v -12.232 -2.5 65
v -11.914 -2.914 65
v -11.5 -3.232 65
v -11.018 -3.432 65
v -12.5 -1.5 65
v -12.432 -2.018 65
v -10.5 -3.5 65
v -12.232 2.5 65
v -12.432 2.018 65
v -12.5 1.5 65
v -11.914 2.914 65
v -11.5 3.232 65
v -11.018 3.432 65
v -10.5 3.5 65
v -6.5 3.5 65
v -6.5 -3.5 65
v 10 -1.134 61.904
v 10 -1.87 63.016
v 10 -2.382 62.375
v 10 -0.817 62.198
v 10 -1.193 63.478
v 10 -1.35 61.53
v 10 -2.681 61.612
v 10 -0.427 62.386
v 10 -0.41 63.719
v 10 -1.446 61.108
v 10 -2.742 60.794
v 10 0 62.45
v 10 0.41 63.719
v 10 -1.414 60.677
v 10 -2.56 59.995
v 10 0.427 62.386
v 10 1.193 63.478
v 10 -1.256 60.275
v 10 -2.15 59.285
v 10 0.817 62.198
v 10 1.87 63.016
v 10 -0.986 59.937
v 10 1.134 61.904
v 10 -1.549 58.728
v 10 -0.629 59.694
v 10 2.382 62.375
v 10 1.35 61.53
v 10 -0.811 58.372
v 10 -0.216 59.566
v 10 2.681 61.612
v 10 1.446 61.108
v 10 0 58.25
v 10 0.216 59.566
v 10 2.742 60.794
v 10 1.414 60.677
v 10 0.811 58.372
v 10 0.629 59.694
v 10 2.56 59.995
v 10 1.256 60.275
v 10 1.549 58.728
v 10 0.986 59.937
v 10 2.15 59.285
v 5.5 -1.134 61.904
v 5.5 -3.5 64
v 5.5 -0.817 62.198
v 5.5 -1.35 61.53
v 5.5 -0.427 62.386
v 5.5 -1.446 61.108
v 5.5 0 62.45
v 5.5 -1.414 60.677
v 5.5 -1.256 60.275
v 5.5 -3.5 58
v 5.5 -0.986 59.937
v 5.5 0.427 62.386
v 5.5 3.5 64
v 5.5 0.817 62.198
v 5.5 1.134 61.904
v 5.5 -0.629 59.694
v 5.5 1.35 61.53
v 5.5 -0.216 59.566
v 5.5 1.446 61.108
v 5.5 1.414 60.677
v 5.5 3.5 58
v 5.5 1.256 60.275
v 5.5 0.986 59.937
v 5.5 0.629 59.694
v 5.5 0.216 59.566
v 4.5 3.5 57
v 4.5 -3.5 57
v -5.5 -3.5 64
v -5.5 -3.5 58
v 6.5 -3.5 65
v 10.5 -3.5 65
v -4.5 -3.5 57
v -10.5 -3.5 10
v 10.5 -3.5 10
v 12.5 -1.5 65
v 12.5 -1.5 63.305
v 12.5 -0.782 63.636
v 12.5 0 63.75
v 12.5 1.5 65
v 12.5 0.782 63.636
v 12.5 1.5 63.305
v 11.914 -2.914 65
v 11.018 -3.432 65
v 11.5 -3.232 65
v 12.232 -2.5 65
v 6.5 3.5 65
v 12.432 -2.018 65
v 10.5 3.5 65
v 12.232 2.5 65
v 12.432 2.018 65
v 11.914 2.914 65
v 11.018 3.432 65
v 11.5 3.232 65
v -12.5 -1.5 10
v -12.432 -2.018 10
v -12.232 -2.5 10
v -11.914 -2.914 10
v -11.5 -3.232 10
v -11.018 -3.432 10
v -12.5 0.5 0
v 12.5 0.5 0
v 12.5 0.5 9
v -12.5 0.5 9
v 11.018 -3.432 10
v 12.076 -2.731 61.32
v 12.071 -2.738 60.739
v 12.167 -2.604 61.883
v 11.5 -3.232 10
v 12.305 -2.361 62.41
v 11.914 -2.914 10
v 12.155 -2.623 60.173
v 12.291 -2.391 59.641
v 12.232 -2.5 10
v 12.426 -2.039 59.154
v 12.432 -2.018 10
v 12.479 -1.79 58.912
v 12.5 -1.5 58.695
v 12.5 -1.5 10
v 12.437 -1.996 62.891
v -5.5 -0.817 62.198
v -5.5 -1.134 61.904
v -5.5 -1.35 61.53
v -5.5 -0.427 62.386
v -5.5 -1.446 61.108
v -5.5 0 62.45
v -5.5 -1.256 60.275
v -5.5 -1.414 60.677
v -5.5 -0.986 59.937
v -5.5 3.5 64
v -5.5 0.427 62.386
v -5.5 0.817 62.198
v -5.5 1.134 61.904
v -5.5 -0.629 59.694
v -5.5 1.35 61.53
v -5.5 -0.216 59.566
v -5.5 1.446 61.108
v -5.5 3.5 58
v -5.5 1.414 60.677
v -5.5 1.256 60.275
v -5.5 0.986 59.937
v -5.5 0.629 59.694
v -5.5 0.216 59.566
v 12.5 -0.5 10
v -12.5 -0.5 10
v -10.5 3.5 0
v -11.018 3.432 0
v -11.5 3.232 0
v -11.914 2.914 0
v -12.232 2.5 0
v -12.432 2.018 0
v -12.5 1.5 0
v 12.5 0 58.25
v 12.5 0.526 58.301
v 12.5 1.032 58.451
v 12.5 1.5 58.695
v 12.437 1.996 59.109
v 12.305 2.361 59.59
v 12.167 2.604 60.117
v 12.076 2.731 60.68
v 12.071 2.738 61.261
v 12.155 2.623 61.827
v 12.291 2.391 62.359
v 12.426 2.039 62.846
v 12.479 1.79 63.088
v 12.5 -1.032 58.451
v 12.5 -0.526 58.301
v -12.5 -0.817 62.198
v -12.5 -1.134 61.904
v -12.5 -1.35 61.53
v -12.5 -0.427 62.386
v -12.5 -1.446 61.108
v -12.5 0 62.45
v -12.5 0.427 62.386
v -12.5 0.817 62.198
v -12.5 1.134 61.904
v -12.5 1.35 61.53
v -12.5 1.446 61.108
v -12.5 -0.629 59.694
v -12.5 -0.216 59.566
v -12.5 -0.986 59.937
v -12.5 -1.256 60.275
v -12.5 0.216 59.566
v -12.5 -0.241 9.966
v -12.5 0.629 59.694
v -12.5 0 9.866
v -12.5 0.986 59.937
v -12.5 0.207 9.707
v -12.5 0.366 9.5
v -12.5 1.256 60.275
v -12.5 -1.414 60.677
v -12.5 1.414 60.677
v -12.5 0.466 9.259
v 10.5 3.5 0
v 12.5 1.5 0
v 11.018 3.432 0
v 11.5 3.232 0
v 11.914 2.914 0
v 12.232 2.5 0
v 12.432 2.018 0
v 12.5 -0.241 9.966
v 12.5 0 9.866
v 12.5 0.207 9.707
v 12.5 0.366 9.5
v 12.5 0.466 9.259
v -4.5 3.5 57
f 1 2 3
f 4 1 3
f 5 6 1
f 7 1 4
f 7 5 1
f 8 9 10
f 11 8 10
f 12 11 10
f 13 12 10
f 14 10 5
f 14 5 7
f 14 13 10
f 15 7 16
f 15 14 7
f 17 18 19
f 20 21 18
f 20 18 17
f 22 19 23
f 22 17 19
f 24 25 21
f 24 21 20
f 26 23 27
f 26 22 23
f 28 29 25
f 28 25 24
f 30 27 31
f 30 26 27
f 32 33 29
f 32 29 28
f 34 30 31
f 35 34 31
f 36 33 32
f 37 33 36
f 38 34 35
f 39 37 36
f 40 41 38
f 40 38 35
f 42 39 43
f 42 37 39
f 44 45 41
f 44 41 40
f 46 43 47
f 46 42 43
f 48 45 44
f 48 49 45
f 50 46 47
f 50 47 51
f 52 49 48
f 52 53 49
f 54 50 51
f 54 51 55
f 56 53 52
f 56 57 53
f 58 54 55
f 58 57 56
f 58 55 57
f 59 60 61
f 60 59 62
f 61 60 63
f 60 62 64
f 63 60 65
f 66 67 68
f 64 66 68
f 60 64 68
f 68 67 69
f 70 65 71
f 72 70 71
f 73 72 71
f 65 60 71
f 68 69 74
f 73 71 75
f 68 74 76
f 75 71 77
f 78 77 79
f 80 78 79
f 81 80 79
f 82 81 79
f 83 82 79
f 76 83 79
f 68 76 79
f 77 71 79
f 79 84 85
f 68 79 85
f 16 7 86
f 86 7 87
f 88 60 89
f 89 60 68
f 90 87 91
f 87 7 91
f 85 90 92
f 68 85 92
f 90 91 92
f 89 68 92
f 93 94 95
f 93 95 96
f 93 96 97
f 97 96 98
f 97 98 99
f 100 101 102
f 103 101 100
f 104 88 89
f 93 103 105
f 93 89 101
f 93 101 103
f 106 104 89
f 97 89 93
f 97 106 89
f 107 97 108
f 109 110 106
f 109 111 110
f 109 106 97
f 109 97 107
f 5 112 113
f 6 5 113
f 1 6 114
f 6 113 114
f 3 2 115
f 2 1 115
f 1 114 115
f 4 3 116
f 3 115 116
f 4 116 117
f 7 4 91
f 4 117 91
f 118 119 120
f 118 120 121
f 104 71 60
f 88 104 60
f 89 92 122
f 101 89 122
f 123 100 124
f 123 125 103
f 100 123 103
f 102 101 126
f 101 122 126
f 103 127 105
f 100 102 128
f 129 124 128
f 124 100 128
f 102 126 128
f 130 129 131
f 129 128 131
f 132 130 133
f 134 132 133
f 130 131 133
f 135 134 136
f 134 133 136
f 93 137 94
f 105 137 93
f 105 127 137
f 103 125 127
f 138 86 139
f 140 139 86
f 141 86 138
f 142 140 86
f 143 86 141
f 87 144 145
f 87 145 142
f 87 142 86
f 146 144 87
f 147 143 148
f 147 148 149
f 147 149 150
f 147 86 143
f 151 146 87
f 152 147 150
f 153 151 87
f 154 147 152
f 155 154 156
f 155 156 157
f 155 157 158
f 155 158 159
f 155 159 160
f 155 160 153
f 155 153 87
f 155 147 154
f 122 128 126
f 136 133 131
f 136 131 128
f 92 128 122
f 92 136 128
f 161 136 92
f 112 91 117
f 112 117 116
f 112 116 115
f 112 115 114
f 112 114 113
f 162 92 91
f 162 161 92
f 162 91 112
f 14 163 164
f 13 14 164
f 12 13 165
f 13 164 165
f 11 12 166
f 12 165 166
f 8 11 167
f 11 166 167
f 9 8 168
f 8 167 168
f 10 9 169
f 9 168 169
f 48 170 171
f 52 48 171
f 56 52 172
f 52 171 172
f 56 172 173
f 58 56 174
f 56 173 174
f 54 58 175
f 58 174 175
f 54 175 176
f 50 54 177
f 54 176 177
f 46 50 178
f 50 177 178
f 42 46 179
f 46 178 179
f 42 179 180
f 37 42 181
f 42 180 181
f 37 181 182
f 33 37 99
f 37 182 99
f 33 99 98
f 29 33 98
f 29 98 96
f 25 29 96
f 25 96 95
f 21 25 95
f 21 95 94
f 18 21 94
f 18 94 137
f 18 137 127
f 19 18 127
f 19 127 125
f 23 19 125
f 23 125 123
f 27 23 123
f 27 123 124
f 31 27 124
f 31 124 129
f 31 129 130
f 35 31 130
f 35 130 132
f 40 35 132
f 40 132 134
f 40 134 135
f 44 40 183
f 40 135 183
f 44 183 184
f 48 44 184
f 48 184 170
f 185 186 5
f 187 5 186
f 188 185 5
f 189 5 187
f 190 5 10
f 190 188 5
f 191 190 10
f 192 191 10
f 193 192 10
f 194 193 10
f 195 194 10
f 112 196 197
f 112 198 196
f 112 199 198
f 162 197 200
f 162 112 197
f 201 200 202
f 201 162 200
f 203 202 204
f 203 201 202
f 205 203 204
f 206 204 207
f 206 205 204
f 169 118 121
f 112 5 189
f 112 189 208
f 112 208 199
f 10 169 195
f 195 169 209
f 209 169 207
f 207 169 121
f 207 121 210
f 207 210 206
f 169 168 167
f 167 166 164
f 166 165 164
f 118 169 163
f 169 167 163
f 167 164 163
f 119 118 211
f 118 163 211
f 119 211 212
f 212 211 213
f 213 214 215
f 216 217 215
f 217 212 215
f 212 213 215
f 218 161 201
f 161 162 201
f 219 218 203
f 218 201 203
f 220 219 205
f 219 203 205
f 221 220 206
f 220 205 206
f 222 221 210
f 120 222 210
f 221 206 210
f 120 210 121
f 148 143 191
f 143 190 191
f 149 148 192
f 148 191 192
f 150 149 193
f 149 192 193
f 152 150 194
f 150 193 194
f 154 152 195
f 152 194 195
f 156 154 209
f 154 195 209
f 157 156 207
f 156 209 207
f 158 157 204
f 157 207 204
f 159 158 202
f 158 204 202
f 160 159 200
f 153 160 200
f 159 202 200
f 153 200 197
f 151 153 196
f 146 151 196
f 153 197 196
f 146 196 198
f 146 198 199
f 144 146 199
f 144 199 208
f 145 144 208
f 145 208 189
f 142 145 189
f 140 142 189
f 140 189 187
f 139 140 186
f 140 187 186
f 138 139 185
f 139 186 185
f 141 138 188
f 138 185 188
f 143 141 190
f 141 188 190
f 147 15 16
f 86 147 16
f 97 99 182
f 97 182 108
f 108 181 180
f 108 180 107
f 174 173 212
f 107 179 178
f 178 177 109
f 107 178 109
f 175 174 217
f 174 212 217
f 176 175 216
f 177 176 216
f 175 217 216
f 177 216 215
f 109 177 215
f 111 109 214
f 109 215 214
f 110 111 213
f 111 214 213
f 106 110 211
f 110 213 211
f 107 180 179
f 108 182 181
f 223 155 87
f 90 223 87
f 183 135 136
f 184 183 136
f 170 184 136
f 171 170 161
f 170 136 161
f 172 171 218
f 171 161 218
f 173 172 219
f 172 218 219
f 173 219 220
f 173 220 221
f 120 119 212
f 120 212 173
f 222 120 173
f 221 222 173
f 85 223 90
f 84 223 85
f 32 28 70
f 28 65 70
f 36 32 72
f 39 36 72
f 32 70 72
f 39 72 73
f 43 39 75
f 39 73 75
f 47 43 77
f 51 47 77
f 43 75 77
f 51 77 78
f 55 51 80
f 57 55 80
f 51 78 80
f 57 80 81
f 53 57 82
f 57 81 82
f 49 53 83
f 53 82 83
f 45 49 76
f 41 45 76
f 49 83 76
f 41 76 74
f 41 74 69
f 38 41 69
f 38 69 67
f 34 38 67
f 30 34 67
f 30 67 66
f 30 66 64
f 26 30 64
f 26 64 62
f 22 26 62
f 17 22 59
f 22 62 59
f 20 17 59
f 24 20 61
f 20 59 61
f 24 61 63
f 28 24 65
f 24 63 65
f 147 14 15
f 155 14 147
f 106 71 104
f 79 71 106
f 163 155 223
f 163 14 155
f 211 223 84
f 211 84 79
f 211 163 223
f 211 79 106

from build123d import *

# Parameters (mm, degrees)
SKETCH1_W                        = 25
SKETCH1_H                        = 7
BOSS_EXTRUDE1_DEPTH              = 65
SKETCH2_W                        = 11
SKETCH2_H                        = 8
CUT_EXTRUDE1_DEPTH               = 67.560123197
CHAMFER1_SIZE                    = 1
CBORE_FOR_M2_5_SHCS2_D           = 2.9
CBORE_FOR_M2_5_SHCS2_CBORE_D     = 5.5
CBORE_FOR_M2_5_SHCS2_CBORE_DEPTH = 2.5
FILLET1_R                        = 2
CHAMFER2_SIZE                    = 1
SKETCH10_W                       = 25
SKETCH10_H                       = 4
CUT_EXTRUDE2_DEPTH               = 10
FILLET2_R                        = 1


with BuildPart() as part:
    # Sketch1 → Boss-Extrude1 (new body)
    with BuildSketch(Plane.XY):
        Rectangle(SKETCH1_W, SKETCH1_H)
    extrude(amount=BOSS_EXTRUDE1_DEPTH)

    # Sketch2 → Cut-Extrude1 (cut, through all)
    with BuildSketch(Plane(origin=(0, 3.5, 0), x_dir=(1, 0, 0), z_dir=(0, 1, 0))):
        with Locations((0, -61)):
            Rectangle(SKETCH2_W, SKETCH2_H)
    extrude(amount=-CUT_EXTRUDE1_DEPTH, mode=Mode.SUBTRACT)

    # Chamfer1
    chamfer1_edges = [part.edges().sort_by_distance(p)[0] for p in [
        (-5.5, 0, 57),
        (5.5, 0, 57),
    ]]
    chamfer(chamfer1_edges, length=CHAMFER1_SIZE)

    # CBORE for M2.5 SHCS2 (through all)
    with Locations(Plane(origin=(12.5, -6.575007997, 116.706532938), x_dir=(0, 0, -1), z_dir=(1, 0, 0))):
        with Locations((55.706532938, 6.575007997)):
            CounterBoreHole(CBORE_FOR_M2_5_SHCS2_D / 2, CBORE_FOR_M2_5_SHCS2_CBORE_D / 2, CBORE_FOR_M2_5_SHCS2_CBORE_DEPTH)

    # Fillet1
    # the kernel refuses this fillet: 2 mm, written as the material it takes off along each edge
    with BuildSketch(Plane(origin=(12.5, -3.5, -5), x_dir=(-1, 0, 0), z_dir=(0, 0, 1)), Plane(origin=(12.5, 3.5, -5), x_dir=(0, -1, 0), z_dir=(0, 0, 1))) as fillet1_piece_1:
        with BuildLine():
            CenterArc((FILLET1_R, -FILLET1_R), FILLET1_R, 90, 90)
            Line((0, -FILLET1_R), (0, 0))
            Line((0, 0), (FILLET1_R, 0))
        make_face()
    extrude(amount=75, mode=Mode.SUBTRACT)
    with BuildSketch(Plane(origin=(-12.5, -3.5, -5), x_dir=(1, 0, 0), z_dir=(0, 0, 1)), Plane(origin=(-12.5, 3.5, -5), x_dir=(0, -1, 0), z_dir=(0, 0, 1))) as fillet1_piece_2:
        with BuildLine():
            CenterArc((FILLET1_R, FILLET1_R), FILLET1_R, 180, 90)
            Line((0, FILLET1_R), (0, 0))
            Line((0, 0), (FILLET1_R, 0))
        make_face()
    extrude(amount=75, mode=Mode.SUBTRACT)

    # Chamfer2
    chamfer2_edges = [part.edges().sort_by_distance(p)[0] for p in [
        (-5.5, 0, 65),
        (5.5, 0, 65),
    ]]
    chamfer(chamfer2_edges, length=CHAMFER2_SIZE)

    # Sketch10 → Cut-Extrude2 (cut)
    with BuildSketch(Plane(origin=(0, 0, 0), x_dir=(-1, 0, 0), z_dir=(0, 0, -1))):
        with Locations((0, -1.5)):
            Rectangle(SKETCH10_W, SKETCH10_H)
    extrude(amount=-CUT_EXTRUDE2_DEPTH, mode=Mode.SUBTRACT)

    # Fillet2
    fillet2_edges = [part.edges().sort_by_distance(p)[0] for p in [
        (0, 0.5, 10),
    ]]
    fillet(fillet2_edges, radius=FILLET2_R)


solid = part.part
